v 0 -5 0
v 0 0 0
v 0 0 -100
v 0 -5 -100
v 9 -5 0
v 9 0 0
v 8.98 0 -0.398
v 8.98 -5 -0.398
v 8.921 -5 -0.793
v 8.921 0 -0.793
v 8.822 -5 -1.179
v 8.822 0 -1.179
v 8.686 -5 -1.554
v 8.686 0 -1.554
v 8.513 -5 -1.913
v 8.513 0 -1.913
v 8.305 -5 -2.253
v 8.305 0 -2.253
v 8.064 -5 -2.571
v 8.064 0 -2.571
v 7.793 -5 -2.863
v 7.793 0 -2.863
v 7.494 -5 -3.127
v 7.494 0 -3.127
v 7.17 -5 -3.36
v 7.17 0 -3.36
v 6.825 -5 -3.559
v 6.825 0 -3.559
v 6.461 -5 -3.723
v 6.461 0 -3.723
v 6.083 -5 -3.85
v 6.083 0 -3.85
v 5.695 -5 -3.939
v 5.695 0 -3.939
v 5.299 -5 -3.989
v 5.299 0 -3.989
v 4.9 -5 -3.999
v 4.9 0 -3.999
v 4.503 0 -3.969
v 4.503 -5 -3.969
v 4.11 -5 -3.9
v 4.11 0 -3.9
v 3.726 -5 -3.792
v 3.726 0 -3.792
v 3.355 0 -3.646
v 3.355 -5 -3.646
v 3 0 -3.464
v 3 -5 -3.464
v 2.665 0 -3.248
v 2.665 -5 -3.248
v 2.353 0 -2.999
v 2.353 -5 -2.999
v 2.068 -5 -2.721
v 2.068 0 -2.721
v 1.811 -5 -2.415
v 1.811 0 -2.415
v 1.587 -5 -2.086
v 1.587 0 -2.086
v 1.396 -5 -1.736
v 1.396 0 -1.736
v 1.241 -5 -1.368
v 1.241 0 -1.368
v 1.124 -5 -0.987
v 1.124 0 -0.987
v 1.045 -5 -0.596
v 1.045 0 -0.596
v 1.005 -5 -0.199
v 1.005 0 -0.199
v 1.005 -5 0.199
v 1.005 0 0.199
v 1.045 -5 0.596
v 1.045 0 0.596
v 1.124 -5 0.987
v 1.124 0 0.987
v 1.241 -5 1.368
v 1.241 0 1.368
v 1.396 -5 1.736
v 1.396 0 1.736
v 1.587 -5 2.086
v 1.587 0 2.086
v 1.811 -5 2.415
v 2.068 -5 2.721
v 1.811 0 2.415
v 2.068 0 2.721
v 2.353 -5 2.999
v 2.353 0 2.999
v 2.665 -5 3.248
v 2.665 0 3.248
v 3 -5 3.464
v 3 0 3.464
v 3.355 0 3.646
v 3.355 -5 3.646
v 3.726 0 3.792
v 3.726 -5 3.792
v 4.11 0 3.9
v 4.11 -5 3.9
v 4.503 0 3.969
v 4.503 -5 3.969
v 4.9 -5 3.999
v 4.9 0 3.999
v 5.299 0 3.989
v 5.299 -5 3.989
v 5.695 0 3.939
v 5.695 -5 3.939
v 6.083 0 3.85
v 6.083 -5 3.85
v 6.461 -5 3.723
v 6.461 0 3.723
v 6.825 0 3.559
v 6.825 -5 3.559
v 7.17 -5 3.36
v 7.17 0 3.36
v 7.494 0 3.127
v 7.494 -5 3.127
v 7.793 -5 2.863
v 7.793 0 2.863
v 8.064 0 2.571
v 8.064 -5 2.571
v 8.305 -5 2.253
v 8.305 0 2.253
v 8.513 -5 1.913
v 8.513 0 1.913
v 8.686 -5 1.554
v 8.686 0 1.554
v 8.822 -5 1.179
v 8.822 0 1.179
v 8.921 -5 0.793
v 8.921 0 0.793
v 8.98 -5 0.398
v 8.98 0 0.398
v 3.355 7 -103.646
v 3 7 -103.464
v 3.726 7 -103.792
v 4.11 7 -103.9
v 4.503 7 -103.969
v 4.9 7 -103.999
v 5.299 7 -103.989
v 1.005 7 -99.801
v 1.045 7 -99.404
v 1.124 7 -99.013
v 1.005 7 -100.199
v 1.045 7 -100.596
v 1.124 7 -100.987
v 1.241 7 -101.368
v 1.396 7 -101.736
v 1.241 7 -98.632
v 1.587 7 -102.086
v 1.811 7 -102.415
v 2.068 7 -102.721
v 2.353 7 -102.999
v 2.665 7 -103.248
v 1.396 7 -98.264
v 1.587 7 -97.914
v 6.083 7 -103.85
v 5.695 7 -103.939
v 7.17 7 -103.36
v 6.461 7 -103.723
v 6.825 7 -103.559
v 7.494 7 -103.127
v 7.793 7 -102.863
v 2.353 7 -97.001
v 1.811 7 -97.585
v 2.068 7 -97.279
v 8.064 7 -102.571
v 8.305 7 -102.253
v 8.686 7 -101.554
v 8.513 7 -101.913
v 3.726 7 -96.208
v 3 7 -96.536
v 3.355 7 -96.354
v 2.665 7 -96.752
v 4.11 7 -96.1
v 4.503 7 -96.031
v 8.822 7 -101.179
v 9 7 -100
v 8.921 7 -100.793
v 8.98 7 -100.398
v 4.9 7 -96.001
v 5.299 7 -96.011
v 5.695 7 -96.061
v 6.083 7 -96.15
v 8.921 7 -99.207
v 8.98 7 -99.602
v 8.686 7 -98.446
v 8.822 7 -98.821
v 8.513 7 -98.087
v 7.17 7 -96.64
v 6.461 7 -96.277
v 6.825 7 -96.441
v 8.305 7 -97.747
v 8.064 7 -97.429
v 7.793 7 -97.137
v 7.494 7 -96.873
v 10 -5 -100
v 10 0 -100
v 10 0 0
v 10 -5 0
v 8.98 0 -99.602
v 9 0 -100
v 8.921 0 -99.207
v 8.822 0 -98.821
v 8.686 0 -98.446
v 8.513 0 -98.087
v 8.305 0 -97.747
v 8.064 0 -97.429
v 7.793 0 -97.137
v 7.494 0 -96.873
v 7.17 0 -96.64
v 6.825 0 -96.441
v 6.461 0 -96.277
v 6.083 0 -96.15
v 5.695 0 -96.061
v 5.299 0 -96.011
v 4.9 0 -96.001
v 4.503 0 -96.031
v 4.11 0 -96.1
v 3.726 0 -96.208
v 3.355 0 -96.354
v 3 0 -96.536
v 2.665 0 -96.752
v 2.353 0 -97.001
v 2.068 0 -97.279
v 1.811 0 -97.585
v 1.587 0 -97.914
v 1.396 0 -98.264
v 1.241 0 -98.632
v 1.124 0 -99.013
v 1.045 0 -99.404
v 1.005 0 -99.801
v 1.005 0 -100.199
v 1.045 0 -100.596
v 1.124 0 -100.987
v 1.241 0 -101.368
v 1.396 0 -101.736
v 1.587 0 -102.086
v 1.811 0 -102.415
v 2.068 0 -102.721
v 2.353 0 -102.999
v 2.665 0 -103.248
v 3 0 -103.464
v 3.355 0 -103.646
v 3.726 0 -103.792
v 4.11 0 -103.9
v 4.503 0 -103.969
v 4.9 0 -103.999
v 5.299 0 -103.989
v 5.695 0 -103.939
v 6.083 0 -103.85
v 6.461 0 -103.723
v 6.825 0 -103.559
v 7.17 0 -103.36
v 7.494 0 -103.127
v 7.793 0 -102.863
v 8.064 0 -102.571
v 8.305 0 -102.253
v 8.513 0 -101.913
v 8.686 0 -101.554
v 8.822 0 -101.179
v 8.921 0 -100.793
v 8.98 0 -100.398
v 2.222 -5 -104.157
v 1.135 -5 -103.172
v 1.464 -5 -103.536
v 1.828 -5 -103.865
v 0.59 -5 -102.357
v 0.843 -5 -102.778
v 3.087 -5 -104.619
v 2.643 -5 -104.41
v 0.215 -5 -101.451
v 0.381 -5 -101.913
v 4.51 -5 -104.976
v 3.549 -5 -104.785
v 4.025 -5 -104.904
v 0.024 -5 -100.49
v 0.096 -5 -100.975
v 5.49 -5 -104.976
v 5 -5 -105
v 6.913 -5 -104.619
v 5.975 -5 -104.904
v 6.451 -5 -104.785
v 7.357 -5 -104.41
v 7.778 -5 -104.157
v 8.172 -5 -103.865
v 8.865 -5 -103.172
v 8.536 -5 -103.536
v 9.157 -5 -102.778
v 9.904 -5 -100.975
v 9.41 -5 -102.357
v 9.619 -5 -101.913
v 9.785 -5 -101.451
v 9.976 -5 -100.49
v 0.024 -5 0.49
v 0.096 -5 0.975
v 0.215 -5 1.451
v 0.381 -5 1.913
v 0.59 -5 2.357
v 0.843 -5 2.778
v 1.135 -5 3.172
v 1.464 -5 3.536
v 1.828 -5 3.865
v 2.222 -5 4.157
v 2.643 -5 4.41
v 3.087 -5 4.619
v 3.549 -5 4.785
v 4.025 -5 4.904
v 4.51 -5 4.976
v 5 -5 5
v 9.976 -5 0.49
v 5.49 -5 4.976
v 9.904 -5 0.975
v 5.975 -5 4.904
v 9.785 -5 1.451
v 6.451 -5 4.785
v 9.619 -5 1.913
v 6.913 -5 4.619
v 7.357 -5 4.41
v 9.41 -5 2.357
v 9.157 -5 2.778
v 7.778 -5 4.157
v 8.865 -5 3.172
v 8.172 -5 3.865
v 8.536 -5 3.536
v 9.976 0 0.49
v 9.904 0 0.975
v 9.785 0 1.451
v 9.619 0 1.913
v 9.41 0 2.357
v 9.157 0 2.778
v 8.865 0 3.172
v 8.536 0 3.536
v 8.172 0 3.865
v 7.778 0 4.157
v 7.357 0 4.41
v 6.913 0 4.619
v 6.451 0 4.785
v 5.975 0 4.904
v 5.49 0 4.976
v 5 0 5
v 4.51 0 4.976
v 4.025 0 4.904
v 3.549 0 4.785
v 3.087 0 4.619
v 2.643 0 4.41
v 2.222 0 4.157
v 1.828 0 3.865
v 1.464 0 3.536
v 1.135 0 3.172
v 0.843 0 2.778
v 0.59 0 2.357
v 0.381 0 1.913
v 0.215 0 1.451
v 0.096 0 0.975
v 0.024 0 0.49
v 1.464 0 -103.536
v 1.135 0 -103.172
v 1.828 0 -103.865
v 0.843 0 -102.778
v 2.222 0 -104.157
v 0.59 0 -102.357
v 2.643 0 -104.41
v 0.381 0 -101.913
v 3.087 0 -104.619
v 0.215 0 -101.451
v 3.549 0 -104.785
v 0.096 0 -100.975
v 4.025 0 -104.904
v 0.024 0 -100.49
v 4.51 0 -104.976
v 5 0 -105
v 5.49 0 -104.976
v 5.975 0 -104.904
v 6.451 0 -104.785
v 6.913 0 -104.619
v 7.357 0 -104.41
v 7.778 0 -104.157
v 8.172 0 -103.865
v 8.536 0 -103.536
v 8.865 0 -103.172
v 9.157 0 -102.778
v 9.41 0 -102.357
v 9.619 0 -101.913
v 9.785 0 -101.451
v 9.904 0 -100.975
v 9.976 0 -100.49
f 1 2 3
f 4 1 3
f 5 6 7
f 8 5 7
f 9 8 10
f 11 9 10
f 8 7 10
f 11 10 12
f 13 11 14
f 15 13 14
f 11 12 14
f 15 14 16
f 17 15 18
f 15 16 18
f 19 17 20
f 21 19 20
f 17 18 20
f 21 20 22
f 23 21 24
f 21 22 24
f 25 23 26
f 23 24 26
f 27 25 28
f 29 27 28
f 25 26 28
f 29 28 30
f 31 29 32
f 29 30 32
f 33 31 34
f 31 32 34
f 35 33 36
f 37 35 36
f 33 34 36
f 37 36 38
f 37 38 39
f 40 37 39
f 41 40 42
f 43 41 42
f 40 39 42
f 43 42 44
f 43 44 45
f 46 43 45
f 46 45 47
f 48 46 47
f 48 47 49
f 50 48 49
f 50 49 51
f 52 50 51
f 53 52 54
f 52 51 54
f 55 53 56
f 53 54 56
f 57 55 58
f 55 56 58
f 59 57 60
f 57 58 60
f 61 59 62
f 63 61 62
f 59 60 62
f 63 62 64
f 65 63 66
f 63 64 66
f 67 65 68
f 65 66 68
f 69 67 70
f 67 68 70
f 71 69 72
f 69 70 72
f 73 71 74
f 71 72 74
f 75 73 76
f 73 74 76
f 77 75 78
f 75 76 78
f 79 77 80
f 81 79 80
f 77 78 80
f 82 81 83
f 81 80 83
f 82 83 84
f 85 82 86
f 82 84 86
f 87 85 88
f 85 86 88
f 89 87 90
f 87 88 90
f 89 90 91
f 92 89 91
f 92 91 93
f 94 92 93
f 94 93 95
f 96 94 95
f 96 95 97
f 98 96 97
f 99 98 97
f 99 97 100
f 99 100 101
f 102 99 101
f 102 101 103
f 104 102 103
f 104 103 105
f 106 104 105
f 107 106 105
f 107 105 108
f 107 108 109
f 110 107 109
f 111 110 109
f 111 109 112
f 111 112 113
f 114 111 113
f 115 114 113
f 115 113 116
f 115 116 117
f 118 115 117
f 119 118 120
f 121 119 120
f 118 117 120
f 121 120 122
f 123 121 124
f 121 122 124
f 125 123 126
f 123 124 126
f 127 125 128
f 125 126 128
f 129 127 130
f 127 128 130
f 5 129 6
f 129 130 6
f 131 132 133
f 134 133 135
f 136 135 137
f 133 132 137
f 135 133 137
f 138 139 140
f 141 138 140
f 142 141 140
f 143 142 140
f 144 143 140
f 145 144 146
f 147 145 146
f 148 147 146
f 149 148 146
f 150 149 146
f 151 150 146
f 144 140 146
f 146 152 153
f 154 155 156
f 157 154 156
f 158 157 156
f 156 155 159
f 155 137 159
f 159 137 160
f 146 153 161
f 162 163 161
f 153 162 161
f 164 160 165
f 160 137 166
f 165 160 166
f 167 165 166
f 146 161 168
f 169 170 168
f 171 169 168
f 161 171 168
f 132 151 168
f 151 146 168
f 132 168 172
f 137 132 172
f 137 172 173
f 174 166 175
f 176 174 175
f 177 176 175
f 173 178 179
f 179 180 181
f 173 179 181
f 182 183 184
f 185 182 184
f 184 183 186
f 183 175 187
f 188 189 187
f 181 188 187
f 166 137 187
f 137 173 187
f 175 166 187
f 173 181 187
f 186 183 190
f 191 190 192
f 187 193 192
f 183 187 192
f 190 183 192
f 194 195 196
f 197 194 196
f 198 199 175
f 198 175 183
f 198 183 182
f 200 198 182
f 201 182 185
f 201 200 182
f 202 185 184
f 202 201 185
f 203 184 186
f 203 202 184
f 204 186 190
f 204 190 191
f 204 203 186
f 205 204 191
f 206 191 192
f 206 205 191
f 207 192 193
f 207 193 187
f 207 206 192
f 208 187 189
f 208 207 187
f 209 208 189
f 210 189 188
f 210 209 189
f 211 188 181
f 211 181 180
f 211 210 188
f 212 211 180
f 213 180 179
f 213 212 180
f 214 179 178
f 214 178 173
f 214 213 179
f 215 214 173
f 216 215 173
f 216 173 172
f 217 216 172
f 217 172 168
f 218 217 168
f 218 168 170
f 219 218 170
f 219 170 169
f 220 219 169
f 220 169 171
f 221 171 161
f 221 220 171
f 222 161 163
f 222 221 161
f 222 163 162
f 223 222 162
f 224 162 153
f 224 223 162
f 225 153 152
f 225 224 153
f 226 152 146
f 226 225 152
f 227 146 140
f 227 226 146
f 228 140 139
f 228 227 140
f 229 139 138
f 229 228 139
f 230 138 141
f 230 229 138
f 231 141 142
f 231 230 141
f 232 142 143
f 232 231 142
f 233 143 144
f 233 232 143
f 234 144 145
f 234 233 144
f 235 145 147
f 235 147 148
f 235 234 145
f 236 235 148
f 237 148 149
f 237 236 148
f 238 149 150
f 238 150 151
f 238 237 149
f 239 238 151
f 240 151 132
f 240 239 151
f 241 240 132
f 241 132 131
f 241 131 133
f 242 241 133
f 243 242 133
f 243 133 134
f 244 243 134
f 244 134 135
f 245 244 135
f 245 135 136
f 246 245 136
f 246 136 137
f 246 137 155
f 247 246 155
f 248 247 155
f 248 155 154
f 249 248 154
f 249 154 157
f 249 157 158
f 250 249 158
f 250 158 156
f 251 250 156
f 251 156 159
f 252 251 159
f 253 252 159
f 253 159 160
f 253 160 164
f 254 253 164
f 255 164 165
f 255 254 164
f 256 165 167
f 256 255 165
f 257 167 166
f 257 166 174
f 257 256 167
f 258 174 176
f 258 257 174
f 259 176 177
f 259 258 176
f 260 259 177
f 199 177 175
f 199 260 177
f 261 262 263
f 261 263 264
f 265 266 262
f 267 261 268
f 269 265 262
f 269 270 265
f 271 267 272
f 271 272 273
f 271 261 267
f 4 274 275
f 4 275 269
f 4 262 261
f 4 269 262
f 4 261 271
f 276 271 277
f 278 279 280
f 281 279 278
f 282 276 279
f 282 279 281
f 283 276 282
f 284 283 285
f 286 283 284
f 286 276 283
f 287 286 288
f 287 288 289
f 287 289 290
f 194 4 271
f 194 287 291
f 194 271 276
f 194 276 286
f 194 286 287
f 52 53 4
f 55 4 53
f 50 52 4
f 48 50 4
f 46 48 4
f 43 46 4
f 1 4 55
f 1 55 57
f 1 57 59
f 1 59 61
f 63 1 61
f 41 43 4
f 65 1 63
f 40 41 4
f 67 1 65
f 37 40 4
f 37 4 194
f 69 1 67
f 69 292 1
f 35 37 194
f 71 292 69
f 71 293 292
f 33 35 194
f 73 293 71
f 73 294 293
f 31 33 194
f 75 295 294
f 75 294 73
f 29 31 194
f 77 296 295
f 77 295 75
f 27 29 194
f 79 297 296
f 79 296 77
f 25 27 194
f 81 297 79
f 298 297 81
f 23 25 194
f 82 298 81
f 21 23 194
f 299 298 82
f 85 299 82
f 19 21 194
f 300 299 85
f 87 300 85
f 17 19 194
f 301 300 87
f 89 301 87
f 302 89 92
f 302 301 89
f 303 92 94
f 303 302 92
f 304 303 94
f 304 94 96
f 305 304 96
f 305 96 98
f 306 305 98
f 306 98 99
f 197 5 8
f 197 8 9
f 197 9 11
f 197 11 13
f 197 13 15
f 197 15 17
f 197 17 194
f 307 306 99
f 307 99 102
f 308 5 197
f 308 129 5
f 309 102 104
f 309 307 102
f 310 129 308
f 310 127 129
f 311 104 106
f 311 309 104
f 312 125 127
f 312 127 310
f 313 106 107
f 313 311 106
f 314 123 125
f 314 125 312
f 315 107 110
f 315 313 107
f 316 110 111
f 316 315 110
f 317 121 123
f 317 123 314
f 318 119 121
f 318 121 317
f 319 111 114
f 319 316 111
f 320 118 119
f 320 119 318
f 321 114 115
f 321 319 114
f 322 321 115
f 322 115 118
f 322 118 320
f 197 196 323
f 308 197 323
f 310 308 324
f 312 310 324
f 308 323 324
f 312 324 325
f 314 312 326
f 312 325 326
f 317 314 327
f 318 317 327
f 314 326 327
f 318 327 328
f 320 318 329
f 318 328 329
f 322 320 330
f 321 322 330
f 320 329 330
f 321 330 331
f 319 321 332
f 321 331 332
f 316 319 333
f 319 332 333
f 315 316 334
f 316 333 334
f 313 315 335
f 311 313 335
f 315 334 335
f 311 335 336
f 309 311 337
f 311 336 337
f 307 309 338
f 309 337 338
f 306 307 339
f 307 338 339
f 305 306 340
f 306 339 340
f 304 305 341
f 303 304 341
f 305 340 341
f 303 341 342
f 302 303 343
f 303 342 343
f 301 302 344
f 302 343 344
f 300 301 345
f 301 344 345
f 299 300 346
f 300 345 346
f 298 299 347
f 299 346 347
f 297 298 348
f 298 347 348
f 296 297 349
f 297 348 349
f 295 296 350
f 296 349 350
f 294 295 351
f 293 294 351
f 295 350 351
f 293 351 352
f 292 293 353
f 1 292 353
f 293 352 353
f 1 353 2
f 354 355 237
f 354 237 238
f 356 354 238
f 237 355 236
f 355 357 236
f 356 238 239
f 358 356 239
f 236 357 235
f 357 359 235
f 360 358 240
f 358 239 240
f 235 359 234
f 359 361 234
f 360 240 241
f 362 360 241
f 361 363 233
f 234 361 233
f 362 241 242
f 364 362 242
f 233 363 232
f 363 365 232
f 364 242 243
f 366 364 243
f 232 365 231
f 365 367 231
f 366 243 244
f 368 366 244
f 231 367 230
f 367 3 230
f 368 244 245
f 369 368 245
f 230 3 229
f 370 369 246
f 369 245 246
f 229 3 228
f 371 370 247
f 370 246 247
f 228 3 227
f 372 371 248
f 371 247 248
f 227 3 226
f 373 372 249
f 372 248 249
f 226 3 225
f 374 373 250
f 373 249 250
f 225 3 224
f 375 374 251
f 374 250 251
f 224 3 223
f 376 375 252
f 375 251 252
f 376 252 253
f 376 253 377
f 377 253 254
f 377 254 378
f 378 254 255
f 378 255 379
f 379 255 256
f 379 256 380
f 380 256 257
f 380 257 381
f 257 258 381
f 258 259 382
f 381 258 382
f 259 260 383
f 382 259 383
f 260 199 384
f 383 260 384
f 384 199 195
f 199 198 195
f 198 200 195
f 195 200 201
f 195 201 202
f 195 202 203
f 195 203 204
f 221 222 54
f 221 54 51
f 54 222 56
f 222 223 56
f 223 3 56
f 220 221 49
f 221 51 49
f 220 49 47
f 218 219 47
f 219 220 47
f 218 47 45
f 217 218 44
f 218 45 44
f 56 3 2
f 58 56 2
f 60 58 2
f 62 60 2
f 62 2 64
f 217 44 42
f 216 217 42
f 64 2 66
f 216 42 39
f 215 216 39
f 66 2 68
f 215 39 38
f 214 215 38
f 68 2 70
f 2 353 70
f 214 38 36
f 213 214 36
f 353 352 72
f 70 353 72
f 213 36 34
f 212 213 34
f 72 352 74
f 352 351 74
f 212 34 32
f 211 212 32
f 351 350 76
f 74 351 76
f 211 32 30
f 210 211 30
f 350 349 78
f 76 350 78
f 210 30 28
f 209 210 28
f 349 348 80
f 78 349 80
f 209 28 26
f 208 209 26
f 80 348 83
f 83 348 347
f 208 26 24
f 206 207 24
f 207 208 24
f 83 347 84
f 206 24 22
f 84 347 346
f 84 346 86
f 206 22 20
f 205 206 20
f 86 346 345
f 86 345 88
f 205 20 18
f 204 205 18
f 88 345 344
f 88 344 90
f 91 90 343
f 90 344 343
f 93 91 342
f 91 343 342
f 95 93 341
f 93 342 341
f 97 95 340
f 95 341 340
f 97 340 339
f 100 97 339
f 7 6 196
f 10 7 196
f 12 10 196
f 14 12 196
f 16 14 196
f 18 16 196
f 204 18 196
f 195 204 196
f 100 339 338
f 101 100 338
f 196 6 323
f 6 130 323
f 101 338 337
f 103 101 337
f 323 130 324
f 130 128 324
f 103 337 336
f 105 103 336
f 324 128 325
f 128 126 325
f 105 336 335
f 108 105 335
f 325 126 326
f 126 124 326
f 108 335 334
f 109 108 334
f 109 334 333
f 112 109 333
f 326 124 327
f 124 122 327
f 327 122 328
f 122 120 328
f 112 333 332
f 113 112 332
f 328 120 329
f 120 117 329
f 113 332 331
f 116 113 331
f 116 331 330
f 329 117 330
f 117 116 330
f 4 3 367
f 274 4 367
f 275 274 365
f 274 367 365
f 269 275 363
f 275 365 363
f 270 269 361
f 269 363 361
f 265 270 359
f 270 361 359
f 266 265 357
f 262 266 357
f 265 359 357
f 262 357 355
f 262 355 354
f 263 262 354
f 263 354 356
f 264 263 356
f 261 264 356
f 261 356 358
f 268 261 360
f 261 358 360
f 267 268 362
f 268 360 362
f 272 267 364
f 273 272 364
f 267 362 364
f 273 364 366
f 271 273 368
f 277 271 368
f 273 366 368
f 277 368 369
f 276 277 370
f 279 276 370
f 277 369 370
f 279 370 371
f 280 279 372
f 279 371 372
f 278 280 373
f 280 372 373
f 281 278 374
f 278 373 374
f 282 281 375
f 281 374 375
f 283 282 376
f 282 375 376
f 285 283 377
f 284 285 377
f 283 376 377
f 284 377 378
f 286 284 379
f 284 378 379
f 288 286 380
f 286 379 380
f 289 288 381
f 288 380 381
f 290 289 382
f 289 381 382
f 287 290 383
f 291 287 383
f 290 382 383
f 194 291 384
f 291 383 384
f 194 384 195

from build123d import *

# Parameters (mm, degrees)
F1_DEPTH = 5
F2_DEPTH = 7


with BuildPart() as f1:
    # F0 (on Front) → F1 (new body)
    with BuildSketch(Plane.XZ):
        with BuildLine():
            ThreePointArc((1, 0), (5, 4), (9, 0))
            Line((9, 0), (10, 0))
            ThreePointArc((10, 0), (5, 5), (0, 0))
            Line((0, 0), (1, 0))
        make_face()
        with BuildLine():
            Line((10, 0), (9, 0))
            ThreePointArc((9, 0), (5, -4), (1, 0))
            Line((1, 0), (0, 0))
            ThreePointArc((0, 0), (5, -5), (10, 0))
        make_face()
        with BuildLine():
            Line((10, -100), (10, 0))
            ThreePointArc((10, 0), (5, -5), (0, 0))
            Line((0, 0), (0, -100))
            ThreePointArc((0, -100), (5, -95), (10, -100))
        make_face()
        with BuildLine():
            ThreePointArc((0, -100), (5, -105), (10, -100))
            Line((10, -100), (9, -100))
            ThreePointArc((9, -100), (5, -104), (1, -100))
            Line((1, -100), (0, -100))
        make_face()
        with BuildLine():
            Line((9, -100), (10, -100))
            ThreePointArc((10, -100), (5, -95), (0, -100))
            Line((0, -100), (1, -100))
            ThreePointArc((1, -100), (5, -96), (9, -100))
        make_face()
        with BuildLine():
            ThreePointArc((1, -100), (5, -104), (9, -100))
            Line((9, -100), (1, -100))
        make_face()
        with BuildLine():
            Line((1, -100), (9, -100))
            ThreePointArc((9, -100), (5, -96), (1, -100))
        make_face()
    extrude(amount=F1_DEPTH)

    # F0 (on Front) → F2 (join)
    with BuildSketch(Plane.XZ):
        with BuildLine():
            ThreePointArc((1, -100), (5, -104), (9, -100))
            Line((9, -100), (1, -100))
        make_face()
        with BuildLine():
            Line((1, -100), (9, -100))
            ThreePointArc((9, -100), (5, -96), (1, -100))
        make_face()
    extrude(amount=-F2_DEPTH)


solid = f1.part
